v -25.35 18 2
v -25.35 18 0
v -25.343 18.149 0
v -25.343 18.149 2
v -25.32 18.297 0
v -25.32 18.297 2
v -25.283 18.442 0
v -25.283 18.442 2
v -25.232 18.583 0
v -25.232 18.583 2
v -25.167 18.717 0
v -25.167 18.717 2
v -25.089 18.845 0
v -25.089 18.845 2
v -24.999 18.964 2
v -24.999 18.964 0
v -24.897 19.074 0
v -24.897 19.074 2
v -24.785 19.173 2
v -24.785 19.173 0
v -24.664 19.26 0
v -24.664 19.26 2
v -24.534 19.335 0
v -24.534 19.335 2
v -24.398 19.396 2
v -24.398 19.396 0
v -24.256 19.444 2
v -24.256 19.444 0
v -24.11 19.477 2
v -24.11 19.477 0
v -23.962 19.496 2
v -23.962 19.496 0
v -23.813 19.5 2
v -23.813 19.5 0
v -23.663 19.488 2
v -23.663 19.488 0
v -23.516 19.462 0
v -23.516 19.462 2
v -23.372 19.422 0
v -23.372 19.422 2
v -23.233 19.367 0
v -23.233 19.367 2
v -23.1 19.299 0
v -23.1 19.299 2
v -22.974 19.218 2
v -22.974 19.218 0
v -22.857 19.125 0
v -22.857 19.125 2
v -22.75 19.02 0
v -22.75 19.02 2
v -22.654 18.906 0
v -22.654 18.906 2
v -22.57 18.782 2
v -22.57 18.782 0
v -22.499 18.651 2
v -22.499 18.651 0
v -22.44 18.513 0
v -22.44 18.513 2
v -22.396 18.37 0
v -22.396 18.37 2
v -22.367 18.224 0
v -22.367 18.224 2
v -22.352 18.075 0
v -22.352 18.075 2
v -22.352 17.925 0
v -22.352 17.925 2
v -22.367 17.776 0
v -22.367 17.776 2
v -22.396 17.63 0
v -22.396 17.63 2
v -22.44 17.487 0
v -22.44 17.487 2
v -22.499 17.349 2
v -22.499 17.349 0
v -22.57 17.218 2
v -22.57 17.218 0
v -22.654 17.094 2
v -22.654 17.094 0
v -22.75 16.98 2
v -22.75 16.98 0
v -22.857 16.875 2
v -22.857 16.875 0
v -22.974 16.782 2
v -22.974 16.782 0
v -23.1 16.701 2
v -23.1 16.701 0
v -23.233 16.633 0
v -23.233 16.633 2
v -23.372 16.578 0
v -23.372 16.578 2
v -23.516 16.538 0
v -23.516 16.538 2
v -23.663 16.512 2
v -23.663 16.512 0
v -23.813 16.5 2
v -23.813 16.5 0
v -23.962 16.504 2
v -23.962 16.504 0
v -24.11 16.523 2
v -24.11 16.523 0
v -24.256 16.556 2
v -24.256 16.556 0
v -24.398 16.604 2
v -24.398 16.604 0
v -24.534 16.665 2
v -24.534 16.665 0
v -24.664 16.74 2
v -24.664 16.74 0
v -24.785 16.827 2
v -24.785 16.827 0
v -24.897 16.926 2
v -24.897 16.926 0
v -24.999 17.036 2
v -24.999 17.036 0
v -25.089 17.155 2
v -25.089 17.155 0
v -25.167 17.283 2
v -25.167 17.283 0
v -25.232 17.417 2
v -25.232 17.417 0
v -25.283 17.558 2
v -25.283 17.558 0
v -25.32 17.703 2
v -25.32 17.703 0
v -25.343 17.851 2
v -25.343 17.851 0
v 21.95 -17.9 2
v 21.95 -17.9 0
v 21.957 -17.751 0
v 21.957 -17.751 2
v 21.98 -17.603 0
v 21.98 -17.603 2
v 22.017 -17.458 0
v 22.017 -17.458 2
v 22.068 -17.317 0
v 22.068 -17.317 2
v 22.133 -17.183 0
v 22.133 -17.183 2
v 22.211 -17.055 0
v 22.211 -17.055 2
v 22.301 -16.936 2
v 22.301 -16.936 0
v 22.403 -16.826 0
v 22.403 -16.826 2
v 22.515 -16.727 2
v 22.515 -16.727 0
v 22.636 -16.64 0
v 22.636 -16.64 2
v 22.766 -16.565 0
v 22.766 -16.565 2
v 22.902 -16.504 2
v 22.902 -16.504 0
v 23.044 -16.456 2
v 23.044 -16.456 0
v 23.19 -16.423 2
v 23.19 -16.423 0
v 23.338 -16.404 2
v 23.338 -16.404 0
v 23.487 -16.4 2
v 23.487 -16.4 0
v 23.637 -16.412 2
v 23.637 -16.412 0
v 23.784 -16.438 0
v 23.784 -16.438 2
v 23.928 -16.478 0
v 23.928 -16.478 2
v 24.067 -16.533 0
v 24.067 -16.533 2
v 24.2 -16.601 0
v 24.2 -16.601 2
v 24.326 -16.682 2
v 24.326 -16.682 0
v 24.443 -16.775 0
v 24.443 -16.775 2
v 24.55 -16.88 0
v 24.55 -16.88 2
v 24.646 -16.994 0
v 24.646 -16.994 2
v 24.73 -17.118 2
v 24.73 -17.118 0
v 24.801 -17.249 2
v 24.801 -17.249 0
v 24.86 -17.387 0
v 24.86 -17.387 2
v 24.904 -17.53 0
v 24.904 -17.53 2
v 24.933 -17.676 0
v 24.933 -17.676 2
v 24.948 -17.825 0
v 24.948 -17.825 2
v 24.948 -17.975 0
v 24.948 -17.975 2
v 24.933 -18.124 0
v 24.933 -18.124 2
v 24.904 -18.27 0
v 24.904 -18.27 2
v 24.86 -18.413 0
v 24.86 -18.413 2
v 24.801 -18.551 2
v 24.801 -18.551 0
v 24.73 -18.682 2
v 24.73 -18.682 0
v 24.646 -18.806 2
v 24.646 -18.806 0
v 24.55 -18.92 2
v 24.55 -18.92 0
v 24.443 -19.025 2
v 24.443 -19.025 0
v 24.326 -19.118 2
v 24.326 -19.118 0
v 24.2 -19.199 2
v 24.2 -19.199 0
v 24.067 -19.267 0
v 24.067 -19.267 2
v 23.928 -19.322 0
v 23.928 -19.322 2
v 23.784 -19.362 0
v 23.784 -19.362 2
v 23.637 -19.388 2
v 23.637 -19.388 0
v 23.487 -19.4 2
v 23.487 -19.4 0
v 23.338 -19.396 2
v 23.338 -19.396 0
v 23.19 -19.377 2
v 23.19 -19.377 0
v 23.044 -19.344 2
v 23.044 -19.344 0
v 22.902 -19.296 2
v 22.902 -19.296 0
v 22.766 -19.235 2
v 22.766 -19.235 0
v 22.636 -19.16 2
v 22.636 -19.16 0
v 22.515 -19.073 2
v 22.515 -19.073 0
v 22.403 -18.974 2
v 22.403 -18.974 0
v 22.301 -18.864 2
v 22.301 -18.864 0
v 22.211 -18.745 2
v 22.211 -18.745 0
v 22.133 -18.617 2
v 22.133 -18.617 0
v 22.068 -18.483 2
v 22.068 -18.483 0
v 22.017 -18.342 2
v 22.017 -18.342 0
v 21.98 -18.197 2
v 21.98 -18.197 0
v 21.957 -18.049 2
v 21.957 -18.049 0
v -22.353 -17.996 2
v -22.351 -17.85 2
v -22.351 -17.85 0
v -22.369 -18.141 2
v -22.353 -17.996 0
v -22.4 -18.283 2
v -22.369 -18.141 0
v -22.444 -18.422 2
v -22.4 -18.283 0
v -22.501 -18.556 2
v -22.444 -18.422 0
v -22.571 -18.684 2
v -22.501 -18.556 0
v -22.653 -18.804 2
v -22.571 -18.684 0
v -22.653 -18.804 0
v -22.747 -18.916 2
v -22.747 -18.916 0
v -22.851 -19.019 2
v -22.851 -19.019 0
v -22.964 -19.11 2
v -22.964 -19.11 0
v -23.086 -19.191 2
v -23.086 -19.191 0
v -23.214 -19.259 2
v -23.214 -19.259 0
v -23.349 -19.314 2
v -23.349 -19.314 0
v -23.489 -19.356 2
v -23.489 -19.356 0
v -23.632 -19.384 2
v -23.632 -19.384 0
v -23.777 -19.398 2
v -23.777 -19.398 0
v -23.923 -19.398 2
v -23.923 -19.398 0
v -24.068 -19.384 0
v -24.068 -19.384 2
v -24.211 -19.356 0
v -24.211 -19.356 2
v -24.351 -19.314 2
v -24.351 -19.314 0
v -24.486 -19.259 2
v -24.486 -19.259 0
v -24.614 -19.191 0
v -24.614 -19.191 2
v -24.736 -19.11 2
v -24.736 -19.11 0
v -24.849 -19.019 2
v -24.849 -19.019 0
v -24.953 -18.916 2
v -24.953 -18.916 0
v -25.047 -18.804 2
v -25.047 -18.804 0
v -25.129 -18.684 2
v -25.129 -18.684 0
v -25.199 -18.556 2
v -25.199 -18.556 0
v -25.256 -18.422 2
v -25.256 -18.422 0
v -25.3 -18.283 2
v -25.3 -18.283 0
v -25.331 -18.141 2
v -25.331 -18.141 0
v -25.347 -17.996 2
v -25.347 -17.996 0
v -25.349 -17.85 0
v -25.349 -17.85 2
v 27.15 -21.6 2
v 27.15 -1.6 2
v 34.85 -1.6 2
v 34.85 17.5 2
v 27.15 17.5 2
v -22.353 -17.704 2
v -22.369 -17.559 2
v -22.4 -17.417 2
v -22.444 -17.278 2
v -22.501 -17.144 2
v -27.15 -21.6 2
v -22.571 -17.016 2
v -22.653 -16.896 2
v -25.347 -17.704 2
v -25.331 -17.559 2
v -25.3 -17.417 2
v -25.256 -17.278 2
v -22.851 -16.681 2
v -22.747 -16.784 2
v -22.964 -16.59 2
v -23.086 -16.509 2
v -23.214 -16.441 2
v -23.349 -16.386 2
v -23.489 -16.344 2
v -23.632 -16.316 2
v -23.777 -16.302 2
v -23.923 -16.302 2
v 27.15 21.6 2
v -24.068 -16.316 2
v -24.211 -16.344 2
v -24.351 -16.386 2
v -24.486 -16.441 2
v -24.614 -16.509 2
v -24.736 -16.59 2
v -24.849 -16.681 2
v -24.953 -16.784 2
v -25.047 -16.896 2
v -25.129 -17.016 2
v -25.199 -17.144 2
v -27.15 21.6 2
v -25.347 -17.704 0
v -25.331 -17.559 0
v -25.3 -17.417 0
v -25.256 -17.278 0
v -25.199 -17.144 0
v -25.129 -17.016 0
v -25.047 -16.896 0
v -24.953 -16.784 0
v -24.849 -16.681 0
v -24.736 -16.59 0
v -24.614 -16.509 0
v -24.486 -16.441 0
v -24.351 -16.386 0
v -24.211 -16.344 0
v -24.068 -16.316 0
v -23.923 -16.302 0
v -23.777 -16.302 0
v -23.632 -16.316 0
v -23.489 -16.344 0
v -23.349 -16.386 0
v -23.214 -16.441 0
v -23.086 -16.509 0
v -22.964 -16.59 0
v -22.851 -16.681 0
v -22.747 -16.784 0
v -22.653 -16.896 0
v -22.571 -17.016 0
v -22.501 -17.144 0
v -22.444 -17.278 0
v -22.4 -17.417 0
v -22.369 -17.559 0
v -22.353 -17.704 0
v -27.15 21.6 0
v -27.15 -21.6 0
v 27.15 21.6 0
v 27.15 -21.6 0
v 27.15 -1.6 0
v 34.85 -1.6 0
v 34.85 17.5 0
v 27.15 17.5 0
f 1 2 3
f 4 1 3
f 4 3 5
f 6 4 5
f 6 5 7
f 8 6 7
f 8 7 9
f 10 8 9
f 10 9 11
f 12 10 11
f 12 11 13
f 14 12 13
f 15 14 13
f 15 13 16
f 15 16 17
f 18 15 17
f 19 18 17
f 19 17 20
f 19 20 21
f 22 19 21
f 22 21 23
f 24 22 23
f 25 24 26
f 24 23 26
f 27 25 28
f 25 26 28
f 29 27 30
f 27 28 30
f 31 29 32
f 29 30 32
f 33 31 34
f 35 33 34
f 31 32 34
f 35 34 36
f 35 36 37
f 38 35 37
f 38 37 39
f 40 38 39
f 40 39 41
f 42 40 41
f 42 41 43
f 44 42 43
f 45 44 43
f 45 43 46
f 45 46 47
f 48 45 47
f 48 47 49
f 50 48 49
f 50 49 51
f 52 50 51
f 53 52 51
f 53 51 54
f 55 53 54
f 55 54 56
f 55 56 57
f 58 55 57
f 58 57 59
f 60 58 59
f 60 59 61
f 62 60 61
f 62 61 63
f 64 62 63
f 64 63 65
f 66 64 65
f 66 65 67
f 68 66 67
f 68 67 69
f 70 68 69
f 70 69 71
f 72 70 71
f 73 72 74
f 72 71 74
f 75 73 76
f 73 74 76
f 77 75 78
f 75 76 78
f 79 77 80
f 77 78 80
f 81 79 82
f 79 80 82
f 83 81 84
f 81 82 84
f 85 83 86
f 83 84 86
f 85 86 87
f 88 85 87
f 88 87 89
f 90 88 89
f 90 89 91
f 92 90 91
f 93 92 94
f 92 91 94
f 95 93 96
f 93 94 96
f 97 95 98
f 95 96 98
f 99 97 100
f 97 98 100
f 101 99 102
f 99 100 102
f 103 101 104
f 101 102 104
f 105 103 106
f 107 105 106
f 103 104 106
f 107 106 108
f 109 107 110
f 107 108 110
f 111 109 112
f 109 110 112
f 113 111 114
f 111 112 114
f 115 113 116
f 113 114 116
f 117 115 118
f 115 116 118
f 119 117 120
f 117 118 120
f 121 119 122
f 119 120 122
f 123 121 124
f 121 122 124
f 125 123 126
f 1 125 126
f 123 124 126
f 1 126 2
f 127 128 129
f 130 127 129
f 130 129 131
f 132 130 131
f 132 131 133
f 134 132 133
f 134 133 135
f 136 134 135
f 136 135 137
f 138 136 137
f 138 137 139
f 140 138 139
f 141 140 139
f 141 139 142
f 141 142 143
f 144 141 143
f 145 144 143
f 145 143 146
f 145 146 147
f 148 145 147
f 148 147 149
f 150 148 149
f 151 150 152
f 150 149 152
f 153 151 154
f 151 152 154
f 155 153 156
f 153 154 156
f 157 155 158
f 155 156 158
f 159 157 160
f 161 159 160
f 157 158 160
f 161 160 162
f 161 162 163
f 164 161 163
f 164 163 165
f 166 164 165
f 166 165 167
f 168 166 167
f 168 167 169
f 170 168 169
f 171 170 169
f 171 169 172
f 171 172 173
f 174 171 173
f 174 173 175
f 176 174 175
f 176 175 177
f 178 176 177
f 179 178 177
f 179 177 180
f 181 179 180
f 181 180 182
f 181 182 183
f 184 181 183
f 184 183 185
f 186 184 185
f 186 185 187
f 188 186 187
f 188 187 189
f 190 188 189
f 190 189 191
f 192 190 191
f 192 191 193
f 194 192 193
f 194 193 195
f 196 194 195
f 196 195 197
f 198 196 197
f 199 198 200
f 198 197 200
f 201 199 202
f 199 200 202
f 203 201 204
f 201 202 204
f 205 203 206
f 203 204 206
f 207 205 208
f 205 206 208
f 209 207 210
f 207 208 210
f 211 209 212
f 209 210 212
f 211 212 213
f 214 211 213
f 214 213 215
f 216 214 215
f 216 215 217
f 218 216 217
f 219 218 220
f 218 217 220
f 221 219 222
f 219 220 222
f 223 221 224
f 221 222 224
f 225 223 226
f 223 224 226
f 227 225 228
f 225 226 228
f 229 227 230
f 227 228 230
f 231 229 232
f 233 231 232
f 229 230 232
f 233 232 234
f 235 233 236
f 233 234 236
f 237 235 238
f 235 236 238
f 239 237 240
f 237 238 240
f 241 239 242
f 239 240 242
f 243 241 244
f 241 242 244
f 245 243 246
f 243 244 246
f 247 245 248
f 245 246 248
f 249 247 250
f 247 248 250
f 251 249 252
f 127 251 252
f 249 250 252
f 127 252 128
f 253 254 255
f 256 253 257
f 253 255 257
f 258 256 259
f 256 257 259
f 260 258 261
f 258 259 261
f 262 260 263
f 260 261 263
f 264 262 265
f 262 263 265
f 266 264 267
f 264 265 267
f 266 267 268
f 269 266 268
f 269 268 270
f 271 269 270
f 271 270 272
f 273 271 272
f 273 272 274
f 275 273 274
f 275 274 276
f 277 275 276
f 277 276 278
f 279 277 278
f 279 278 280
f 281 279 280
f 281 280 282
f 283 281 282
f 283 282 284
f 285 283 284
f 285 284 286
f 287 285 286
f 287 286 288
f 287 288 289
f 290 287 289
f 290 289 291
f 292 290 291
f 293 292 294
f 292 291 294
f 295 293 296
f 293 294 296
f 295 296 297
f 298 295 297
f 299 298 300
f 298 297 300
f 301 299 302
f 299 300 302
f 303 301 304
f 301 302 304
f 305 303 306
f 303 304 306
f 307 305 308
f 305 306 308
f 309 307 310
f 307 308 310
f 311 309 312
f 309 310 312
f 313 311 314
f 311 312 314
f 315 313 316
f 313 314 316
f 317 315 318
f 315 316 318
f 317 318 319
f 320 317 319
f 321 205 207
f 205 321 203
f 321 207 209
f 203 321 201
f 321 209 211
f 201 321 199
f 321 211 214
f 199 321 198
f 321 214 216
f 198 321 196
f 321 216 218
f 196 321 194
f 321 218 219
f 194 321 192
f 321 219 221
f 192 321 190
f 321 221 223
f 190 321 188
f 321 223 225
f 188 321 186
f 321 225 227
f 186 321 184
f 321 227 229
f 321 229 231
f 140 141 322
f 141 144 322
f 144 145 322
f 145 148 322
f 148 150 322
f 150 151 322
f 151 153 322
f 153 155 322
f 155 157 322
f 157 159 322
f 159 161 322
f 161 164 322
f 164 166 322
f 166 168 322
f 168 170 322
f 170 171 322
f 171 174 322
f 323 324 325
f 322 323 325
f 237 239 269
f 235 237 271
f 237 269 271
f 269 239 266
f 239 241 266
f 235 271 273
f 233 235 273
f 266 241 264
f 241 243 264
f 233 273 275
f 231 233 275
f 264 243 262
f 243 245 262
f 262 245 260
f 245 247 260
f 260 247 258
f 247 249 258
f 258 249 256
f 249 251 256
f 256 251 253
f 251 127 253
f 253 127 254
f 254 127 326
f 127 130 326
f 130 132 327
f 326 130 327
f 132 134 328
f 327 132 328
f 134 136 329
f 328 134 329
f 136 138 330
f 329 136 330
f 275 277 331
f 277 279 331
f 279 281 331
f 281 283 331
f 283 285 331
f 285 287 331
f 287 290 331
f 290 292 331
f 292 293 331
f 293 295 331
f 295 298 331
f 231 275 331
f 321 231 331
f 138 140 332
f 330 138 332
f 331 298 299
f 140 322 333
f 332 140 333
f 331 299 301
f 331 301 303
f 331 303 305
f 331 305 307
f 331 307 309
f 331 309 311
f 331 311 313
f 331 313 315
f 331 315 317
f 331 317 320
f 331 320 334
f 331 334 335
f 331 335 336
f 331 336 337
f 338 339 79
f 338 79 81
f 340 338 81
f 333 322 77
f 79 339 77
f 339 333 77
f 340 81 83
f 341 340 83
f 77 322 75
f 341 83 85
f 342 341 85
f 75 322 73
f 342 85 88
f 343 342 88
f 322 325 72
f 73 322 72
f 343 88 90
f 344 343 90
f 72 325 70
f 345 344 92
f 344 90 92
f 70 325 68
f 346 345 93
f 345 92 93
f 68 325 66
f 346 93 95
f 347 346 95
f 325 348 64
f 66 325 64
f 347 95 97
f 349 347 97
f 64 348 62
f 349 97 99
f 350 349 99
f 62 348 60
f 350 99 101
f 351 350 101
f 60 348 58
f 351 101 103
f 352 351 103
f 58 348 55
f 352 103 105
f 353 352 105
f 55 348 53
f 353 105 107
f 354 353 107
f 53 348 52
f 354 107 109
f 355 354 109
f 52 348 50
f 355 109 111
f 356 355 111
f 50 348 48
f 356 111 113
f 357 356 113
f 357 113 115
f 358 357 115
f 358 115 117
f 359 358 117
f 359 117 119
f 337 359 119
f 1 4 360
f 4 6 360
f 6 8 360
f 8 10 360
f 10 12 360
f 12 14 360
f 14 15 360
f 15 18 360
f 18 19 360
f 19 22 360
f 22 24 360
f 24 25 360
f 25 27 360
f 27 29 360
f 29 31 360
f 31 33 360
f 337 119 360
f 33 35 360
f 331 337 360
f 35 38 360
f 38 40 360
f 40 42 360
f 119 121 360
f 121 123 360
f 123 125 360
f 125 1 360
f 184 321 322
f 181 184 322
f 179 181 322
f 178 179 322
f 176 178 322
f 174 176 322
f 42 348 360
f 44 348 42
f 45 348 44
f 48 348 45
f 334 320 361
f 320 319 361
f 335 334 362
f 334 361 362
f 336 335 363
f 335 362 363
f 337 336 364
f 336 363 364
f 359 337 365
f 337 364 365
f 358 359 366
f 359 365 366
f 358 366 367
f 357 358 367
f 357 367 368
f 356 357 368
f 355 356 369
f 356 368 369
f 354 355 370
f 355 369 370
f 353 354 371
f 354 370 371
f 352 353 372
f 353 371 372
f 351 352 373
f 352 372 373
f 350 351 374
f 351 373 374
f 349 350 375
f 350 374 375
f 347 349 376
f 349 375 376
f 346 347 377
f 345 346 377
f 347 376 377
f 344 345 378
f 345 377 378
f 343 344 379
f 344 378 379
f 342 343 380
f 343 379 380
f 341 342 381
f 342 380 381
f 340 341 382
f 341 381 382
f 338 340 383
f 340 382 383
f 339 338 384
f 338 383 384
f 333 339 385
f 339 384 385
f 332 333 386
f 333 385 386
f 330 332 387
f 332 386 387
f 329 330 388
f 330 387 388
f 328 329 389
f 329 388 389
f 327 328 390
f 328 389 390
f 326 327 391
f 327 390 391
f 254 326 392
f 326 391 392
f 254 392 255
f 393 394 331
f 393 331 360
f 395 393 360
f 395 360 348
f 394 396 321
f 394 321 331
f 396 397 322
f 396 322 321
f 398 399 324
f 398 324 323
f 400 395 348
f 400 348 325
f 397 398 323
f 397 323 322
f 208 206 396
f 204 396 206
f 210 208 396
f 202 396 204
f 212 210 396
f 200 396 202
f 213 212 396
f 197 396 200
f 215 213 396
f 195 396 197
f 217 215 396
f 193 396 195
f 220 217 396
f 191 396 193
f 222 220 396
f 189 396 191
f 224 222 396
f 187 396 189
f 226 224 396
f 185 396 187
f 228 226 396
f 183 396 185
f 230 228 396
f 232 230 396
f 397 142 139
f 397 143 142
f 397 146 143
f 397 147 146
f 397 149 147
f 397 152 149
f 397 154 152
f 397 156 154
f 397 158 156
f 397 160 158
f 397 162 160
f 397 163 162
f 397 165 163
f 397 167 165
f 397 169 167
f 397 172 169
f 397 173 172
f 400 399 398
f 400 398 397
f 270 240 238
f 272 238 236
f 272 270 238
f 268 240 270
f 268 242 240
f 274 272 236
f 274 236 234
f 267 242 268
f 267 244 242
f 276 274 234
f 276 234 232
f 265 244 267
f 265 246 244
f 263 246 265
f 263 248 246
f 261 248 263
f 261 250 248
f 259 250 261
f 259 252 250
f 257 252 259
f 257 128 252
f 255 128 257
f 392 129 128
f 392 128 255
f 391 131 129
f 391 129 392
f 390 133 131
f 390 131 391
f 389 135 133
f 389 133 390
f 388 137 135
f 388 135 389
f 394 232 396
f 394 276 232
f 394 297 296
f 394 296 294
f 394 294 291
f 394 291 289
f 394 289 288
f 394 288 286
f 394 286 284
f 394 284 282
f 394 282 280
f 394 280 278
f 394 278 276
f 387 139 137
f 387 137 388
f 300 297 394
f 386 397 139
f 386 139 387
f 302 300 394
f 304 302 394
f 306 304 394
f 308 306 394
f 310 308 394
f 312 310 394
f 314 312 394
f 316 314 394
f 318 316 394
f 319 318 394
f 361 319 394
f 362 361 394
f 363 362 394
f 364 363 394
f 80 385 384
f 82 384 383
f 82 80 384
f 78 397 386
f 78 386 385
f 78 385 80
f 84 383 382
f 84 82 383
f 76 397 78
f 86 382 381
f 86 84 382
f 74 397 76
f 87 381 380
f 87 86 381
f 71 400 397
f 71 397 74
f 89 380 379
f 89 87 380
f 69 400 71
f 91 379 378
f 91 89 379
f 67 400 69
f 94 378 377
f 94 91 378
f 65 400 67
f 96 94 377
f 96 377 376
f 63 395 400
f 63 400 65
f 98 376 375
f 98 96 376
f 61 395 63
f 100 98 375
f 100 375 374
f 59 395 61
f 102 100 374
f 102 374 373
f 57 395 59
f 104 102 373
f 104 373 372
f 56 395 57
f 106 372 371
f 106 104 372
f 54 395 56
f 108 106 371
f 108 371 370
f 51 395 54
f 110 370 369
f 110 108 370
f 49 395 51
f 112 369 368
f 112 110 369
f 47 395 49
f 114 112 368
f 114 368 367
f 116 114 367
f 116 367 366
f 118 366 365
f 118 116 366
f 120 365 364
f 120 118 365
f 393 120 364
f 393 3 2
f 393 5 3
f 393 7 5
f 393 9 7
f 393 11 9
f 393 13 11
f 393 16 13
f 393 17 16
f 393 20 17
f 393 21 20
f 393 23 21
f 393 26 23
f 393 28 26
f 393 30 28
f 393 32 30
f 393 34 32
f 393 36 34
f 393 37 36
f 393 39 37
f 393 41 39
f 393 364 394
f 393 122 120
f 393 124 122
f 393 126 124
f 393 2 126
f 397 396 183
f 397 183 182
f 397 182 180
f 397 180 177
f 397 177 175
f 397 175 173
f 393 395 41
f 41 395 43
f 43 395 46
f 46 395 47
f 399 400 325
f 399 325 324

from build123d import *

# Parameters (mm, degrees)
BOSS_EXTRU_1_DEPTH     = 2
D_GAGEMENT_M3_51_D     = 3
D_GAGEMENT_M3_51_DEPTH = 2


with BuildPart() as part:
    # Esquisse1 → Boss.-Extru.1 (new body)
    with BuildSketch(Plane.XY):
        Polygon((27.15, 17.5), (34.85, 17.5), (34.85, -1.6), (27.15, -1.6), (27.15, -21.6), (-27.15, -21.6), (-27.15, 21.6), (27.15, 21.6), align=None)
    extrude(amount=BOSS_EXTRU_1_DEPTH)

    # Dégagement M3.51
    with Locations(Plane.XY.offset(2)):
        with Locations((-23.85, 18), (-23.85, -17.9), (-23.85, -17.8), (23.45, -17.9)):
            Hole(D_GAGEMENT_M3_51_D / 2, depth=D_GAGEMENT_M3_51_DEPTH)


solid = part.part
